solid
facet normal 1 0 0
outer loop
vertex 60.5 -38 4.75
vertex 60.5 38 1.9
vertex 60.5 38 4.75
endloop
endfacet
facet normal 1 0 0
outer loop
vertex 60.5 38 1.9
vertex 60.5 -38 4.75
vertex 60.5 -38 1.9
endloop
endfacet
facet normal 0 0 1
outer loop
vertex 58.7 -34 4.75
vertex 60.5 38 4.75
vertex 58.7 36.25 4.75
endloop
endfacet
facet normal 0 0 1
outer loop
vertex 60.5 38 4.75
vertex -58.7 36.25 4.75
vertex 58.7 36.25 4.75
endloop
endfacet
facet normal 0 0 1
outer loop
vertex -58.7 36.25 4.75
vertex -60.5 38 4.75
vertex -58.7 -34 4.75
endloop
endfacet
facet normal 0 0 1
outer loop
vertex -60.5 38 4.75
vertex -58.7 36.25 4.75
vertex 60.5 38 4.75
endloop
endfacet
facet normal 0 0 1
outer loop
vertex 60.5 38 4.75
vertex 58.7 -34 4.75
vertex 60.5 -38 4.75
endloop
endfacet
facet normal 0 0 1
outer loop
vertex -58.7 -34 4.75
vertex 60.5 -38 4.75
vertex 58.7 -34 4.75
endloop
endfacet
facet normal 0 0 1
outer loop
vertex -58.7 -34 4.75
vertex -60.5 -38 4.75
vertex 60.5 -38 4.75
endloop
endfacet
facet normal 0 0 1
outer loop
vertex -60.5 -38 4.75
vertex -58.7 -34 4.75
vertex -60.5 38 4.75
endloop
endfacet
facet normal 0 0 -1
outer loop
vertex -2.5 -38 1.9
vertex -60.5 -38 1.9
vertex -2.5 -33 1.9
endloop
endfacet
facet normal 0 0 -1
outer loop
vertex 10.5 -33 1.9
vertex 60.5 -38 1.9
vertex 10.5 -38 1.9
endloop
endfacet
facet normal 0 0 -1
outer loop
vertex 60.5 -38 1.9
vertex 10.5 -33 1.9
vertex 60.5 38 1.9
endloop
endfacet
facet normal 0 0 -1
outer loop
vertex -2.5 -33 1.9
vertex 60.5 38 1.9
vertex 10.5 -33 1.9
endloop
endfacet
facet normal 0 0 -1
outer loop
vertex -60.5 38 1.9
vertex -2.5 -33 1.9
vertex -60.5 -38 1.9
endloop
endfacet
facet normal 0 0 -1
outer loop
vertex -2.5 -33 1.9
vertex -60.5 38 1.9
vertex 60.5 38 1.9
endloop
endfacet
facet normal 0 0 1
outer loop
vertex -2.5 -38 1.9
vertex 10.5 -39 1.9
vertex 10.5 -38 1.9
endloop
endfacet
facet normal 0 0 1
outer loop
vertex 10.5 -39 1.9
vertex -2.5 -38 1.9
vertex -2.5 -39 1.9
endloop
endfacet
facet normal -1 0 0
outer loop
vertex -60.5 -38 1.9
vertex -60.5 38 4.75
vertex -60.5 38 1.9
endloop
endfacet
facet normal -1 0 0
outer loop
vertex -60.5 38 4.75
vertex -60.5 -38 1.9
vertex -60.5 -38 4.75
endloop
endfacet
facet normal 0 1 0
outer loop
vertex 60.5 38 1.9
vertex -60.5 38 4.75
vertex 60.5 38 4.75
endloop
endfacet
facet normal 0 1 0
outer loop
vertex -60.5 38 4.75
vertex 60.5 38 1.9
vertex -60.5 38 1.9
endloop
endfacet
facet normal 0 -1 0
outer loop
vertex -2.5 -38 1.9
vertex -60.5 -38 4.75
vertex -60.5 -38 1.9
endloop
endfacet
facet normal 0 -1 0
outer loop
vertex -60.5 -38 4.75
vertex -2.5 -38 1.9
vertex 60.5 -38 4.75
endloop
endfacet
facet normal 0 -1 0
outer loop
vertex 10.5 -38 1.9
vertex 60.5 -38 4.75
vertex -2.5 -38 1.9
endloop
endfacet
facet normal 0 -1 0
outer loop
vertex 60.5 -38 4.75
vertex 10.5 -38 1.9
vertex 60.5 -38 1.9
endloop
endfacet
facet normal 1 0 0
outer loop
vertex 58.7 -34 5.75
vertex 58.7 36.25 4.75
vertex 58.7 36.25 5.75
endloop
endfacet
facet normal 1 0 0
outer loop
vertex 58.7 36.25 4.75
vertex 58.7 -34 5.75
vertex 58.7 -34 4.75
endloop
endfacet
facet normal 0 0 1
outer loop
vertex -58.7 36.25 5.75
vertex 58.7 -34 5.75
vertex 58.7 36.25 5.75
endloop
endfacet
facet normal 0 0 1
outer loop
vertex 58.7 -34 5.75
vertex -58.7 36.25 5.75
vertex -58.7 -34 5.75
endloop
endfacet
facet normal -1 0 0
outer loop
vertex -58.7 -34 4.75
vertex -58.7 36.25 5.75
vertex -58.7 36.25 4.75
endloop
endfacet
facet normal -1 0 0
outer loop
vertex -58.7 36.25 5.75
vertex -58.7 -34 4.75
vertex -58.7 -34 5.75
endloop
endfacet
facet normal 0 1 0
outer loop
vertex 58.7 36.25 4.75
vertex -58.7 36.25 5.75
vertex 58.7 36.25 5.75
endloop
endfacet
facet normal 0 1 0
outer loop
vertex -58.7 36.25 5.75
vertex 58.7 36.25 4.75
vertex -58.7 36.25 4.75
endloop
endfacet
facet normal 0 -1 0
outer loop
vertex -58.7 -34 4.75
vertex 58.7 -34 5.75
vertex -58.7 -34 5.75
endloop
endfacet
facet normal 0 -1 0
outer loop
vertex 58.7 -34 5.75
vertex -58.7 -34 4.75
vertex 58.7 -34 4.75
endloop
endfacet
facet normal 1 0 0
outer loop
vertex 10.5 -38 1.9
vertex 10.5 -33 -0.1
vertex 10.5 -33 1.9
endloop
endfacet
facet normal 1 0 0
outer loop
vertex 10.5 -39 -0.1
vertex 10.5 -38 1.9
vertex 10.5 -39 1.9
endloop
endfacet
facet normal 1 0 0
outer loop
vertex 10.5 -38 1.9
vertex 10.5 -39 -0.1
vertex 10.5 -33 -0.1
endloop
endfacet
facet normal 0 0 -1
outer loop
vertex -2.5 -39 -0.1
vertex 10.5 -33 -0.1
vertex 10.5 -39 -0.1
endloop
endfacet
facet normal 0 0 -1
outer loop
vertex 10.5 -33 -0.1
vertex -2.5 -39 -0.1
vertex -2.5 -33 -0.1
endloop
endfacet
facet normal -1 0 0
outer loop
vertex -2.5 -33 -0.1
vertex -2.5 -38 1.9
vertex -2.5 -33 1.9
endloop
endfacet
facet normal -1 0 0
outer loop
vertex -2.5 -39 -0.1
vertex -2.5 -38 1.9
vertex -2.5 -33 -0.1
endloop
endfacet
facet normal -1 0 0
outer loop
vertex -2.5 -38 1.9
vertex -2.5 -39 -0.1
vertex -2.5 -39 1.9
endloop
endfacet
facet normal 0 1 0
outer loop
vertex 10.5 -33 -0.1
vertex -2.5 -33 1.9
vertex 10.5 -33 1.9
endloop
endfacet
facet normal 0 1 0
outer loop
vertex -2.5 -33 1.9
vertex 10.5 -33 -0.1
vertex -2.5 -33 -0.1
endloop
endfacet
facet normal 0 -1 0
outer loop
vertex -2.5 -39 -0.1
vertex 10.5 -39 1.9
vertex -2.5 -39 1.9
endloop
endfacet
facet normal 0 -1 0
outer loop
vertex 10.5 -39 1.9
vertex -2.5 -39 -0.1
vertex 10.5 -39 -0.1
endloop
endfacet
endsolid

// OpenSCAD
$fn=64;

// HDMI display 5"
// Overall: 121 x 76 x 2.85
// PCB offset: [0,0,1.9]
// Aperture: [[-54, -30.225], [54, 34.575, 0.5]]
// Touch screen: [[-58.7, -34], [58.7, 36.25, 1]]
// Thread length: 2
// Clearance for TS ribbon: [[-2.5, -39], [10.5, -33]]

module hdmi_display_5in(
    size = [121, 76, 2.85],
    pcb_offset = [0,0,1.9],
    aperture = [[-54, -30.225], [54, 34.575, 0.5]],
    touch = [[-58.7, -34], [58.7, 36.25, 1]],
    ribbon_clear = [[-2.5, -39], [10.5, -33]],
    thread_len = 2
){
    // Base PCB slab
    color([0.05,0.35,0.12])
    translate([-size[0]/2, -size[1]/2, pcb_offset[2]])
        cube(size, center=false);

    // Touchscreen glass (slightly above PCB)
    touch_min = touch[0];
    touch_max = touch[1];
    touch_th  = touch[1][2];

    color([0.2,0.2,0.2,0.35])
    translate([touch_min[0], touch_min[1], pcb_offset[2] + size[2]])
        cube([touch_max[0]-touch_min[0], touch_max[1]-touch_min[1], touch_th], center=false);

    // Display aperture (visual cutout region on top surface)
    ap_min = aperture[0];
    ap_max = aperture[1];
    ap_th  = aperture[1][2];

    color([0,0,0])
    translate([ap_min[0], ap_min[1], pcb_offset[2] + size[2] + 0.01])
        cube([ap_max[0]-ap_min[0], ap_max[1]-ap_min[1], ap_th], center=false);

    // Ribbon clearance volume (shown as translucent block below PCB edge)
    rc_min = ribbon_clear[0];
    rc_max = ribbon_clear[1];
    color([1,0,0,0.25])
    translate([rc_min[0], rc_min[1], pcb_offset[2] - thread_len])
        cube([rc_max[0]-rc_min[0], rc_max[1]-rc_min[1], thread_len], center=false);
}

hdmi_display_5in();
